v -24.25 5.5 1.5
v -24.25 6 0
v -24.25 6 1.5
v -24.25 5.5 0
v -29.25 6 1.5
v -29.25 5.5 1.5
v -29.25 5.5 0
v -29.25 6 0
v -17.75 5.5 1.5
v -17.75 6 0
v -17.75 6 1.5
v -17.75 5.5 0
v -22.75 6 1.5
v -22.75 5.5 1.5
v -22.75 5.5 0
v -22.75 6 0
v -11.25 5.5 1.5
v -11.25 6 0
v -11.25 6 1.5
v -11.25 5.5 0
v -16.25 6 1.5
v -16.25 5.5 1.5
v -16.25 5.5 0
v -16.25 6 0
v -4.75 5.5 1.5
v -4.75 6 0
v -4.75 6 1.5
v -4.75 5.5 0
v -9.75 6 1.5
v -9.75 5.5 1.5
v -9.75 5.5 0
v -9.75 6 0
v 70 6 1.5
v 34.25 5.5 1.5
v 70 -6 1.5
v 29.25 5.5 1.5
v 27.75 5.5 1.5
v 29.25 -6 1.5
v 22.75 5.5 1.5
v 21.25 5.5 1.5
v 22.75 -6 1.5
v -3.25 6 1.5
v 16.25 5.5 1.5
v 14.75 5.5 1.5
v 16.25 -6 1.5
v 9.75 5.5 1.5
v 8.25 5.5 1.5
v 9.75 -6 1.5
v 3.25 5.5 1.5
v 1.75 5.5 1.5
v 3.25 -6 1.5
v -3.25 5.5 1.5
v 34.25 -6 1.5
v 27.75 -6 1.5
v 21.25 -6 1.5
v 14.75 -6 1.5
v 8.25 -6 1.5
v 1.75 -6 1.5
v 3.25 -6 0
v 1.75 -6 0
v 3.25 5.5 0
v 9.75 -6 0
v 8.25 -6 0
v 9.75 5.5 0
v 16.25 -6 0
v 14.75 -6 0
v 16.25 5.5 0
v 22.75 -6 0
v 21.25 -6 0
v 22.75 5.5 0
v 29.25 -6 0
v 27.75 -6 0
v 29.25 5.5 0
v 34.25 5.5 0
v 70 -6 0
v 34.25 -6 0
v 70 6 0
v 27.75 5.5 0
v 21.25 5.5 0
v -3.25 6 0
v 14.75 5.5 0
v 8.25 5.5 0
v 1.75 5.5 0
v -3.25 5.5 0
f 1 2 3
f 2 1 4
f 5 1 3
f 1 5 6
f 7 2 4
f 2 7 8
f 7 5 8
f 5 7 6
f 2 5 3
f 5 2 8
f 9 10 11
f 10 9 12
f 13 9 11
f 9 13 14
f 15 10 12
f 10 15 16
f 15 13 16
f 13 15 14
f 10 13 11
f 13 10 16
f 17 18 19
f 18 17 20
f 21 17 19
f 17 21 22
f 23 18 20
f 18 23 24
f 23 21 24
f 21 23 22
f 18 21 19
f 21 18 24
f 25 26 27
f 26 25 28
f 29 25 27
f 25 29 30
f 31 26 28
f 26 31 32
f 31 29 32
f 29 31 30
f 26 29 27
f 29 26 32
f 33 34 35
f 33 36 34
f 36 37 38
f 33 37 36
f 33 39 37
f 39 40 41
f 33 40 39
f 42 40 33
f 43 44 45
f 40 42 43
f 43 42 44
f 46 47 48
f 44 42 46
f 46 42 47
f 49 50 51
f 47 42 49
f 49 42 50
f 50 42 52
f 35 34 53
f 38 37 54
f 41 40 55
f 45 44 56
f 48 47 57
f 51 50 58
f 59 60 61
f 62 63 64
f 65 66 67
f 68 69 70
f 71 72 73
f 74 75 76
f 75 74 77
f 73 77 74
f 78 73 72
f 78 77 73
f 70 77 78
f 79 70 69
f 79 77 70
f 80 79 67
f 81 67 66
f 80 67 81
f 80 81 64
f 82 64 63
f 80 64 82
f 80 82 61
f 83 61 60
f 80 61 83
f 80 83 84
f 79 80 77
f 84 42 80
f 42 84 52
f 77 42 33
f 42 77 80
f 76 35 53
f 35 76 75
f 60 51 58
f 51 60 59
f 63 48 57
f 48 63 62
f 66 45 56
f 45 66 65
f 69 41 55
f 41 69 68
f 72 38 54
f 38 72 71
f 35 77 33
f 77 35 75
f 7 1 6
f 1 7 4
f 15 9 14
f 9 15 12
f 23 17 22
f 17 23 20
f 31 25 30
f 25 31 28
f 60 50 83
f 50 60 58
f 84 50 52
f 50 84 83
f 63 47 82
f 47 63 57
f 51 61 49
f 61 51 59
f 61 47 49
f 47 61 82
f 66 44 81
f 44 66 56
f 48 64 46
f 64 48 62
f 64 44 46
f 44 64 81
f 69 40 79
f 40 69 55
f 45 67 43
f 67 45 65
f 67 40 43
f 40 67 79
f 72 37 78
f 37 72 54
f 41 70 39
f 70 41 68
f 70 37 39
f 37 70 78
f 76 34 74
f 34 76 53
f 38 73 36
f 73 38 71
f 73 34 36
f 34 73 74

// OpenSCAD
// 10-well comb for casting agarose gels, printed lying flat
// Units: mm

// ---- Parameters ----
plate_t      = 1.5;   // plate thickness (Z)
spine_l      = 70;    // spine length (X)
spine_w      = 12;    // spine width (Y)
teeth_n      = 10;    // number of teeth
teeth_w      = 5.0;   // tooth width (X)
teeth_l      = 12;    // tooth length (Y)
teeth_gap    = 1.5;   // gap between teeth (X)
overcut      = 0.5;   // extra length on cutters past faces (Z)

// Derived
pitch        = teeth_w + teeth_gap;   // centre-to-centre tooth spacing
x0           = -(teeth_n - 1) * pitch / 2;  // first tooth X (centred row)

// ---- Model ----
difference() {
    union() {
        // Spine (back bar)
        translate([0, -spine_w / 2, 0])
            cube([spine_l, spine_w, plate_t]);

        // Teeth hanging in -Y from the spine's +Y edge
        for (i = [0 : teeth_n - 1])
            translate([x0 + i * pitch, spine_w / 2 - teeth_l, 0])
                cube([teeth_w, teeth_l, plate_t]);
    }

    // Cut out the 10 wells from the +Y face of the plate
    for (i = [0 : teeth_n - 1])
        translate([x0 + i * pitch, spine_w / 2 - teeth_l - overcut, -overcut])
            cube([teeth_w, teeth_l, plate_t + 2 * overcut]);
}
